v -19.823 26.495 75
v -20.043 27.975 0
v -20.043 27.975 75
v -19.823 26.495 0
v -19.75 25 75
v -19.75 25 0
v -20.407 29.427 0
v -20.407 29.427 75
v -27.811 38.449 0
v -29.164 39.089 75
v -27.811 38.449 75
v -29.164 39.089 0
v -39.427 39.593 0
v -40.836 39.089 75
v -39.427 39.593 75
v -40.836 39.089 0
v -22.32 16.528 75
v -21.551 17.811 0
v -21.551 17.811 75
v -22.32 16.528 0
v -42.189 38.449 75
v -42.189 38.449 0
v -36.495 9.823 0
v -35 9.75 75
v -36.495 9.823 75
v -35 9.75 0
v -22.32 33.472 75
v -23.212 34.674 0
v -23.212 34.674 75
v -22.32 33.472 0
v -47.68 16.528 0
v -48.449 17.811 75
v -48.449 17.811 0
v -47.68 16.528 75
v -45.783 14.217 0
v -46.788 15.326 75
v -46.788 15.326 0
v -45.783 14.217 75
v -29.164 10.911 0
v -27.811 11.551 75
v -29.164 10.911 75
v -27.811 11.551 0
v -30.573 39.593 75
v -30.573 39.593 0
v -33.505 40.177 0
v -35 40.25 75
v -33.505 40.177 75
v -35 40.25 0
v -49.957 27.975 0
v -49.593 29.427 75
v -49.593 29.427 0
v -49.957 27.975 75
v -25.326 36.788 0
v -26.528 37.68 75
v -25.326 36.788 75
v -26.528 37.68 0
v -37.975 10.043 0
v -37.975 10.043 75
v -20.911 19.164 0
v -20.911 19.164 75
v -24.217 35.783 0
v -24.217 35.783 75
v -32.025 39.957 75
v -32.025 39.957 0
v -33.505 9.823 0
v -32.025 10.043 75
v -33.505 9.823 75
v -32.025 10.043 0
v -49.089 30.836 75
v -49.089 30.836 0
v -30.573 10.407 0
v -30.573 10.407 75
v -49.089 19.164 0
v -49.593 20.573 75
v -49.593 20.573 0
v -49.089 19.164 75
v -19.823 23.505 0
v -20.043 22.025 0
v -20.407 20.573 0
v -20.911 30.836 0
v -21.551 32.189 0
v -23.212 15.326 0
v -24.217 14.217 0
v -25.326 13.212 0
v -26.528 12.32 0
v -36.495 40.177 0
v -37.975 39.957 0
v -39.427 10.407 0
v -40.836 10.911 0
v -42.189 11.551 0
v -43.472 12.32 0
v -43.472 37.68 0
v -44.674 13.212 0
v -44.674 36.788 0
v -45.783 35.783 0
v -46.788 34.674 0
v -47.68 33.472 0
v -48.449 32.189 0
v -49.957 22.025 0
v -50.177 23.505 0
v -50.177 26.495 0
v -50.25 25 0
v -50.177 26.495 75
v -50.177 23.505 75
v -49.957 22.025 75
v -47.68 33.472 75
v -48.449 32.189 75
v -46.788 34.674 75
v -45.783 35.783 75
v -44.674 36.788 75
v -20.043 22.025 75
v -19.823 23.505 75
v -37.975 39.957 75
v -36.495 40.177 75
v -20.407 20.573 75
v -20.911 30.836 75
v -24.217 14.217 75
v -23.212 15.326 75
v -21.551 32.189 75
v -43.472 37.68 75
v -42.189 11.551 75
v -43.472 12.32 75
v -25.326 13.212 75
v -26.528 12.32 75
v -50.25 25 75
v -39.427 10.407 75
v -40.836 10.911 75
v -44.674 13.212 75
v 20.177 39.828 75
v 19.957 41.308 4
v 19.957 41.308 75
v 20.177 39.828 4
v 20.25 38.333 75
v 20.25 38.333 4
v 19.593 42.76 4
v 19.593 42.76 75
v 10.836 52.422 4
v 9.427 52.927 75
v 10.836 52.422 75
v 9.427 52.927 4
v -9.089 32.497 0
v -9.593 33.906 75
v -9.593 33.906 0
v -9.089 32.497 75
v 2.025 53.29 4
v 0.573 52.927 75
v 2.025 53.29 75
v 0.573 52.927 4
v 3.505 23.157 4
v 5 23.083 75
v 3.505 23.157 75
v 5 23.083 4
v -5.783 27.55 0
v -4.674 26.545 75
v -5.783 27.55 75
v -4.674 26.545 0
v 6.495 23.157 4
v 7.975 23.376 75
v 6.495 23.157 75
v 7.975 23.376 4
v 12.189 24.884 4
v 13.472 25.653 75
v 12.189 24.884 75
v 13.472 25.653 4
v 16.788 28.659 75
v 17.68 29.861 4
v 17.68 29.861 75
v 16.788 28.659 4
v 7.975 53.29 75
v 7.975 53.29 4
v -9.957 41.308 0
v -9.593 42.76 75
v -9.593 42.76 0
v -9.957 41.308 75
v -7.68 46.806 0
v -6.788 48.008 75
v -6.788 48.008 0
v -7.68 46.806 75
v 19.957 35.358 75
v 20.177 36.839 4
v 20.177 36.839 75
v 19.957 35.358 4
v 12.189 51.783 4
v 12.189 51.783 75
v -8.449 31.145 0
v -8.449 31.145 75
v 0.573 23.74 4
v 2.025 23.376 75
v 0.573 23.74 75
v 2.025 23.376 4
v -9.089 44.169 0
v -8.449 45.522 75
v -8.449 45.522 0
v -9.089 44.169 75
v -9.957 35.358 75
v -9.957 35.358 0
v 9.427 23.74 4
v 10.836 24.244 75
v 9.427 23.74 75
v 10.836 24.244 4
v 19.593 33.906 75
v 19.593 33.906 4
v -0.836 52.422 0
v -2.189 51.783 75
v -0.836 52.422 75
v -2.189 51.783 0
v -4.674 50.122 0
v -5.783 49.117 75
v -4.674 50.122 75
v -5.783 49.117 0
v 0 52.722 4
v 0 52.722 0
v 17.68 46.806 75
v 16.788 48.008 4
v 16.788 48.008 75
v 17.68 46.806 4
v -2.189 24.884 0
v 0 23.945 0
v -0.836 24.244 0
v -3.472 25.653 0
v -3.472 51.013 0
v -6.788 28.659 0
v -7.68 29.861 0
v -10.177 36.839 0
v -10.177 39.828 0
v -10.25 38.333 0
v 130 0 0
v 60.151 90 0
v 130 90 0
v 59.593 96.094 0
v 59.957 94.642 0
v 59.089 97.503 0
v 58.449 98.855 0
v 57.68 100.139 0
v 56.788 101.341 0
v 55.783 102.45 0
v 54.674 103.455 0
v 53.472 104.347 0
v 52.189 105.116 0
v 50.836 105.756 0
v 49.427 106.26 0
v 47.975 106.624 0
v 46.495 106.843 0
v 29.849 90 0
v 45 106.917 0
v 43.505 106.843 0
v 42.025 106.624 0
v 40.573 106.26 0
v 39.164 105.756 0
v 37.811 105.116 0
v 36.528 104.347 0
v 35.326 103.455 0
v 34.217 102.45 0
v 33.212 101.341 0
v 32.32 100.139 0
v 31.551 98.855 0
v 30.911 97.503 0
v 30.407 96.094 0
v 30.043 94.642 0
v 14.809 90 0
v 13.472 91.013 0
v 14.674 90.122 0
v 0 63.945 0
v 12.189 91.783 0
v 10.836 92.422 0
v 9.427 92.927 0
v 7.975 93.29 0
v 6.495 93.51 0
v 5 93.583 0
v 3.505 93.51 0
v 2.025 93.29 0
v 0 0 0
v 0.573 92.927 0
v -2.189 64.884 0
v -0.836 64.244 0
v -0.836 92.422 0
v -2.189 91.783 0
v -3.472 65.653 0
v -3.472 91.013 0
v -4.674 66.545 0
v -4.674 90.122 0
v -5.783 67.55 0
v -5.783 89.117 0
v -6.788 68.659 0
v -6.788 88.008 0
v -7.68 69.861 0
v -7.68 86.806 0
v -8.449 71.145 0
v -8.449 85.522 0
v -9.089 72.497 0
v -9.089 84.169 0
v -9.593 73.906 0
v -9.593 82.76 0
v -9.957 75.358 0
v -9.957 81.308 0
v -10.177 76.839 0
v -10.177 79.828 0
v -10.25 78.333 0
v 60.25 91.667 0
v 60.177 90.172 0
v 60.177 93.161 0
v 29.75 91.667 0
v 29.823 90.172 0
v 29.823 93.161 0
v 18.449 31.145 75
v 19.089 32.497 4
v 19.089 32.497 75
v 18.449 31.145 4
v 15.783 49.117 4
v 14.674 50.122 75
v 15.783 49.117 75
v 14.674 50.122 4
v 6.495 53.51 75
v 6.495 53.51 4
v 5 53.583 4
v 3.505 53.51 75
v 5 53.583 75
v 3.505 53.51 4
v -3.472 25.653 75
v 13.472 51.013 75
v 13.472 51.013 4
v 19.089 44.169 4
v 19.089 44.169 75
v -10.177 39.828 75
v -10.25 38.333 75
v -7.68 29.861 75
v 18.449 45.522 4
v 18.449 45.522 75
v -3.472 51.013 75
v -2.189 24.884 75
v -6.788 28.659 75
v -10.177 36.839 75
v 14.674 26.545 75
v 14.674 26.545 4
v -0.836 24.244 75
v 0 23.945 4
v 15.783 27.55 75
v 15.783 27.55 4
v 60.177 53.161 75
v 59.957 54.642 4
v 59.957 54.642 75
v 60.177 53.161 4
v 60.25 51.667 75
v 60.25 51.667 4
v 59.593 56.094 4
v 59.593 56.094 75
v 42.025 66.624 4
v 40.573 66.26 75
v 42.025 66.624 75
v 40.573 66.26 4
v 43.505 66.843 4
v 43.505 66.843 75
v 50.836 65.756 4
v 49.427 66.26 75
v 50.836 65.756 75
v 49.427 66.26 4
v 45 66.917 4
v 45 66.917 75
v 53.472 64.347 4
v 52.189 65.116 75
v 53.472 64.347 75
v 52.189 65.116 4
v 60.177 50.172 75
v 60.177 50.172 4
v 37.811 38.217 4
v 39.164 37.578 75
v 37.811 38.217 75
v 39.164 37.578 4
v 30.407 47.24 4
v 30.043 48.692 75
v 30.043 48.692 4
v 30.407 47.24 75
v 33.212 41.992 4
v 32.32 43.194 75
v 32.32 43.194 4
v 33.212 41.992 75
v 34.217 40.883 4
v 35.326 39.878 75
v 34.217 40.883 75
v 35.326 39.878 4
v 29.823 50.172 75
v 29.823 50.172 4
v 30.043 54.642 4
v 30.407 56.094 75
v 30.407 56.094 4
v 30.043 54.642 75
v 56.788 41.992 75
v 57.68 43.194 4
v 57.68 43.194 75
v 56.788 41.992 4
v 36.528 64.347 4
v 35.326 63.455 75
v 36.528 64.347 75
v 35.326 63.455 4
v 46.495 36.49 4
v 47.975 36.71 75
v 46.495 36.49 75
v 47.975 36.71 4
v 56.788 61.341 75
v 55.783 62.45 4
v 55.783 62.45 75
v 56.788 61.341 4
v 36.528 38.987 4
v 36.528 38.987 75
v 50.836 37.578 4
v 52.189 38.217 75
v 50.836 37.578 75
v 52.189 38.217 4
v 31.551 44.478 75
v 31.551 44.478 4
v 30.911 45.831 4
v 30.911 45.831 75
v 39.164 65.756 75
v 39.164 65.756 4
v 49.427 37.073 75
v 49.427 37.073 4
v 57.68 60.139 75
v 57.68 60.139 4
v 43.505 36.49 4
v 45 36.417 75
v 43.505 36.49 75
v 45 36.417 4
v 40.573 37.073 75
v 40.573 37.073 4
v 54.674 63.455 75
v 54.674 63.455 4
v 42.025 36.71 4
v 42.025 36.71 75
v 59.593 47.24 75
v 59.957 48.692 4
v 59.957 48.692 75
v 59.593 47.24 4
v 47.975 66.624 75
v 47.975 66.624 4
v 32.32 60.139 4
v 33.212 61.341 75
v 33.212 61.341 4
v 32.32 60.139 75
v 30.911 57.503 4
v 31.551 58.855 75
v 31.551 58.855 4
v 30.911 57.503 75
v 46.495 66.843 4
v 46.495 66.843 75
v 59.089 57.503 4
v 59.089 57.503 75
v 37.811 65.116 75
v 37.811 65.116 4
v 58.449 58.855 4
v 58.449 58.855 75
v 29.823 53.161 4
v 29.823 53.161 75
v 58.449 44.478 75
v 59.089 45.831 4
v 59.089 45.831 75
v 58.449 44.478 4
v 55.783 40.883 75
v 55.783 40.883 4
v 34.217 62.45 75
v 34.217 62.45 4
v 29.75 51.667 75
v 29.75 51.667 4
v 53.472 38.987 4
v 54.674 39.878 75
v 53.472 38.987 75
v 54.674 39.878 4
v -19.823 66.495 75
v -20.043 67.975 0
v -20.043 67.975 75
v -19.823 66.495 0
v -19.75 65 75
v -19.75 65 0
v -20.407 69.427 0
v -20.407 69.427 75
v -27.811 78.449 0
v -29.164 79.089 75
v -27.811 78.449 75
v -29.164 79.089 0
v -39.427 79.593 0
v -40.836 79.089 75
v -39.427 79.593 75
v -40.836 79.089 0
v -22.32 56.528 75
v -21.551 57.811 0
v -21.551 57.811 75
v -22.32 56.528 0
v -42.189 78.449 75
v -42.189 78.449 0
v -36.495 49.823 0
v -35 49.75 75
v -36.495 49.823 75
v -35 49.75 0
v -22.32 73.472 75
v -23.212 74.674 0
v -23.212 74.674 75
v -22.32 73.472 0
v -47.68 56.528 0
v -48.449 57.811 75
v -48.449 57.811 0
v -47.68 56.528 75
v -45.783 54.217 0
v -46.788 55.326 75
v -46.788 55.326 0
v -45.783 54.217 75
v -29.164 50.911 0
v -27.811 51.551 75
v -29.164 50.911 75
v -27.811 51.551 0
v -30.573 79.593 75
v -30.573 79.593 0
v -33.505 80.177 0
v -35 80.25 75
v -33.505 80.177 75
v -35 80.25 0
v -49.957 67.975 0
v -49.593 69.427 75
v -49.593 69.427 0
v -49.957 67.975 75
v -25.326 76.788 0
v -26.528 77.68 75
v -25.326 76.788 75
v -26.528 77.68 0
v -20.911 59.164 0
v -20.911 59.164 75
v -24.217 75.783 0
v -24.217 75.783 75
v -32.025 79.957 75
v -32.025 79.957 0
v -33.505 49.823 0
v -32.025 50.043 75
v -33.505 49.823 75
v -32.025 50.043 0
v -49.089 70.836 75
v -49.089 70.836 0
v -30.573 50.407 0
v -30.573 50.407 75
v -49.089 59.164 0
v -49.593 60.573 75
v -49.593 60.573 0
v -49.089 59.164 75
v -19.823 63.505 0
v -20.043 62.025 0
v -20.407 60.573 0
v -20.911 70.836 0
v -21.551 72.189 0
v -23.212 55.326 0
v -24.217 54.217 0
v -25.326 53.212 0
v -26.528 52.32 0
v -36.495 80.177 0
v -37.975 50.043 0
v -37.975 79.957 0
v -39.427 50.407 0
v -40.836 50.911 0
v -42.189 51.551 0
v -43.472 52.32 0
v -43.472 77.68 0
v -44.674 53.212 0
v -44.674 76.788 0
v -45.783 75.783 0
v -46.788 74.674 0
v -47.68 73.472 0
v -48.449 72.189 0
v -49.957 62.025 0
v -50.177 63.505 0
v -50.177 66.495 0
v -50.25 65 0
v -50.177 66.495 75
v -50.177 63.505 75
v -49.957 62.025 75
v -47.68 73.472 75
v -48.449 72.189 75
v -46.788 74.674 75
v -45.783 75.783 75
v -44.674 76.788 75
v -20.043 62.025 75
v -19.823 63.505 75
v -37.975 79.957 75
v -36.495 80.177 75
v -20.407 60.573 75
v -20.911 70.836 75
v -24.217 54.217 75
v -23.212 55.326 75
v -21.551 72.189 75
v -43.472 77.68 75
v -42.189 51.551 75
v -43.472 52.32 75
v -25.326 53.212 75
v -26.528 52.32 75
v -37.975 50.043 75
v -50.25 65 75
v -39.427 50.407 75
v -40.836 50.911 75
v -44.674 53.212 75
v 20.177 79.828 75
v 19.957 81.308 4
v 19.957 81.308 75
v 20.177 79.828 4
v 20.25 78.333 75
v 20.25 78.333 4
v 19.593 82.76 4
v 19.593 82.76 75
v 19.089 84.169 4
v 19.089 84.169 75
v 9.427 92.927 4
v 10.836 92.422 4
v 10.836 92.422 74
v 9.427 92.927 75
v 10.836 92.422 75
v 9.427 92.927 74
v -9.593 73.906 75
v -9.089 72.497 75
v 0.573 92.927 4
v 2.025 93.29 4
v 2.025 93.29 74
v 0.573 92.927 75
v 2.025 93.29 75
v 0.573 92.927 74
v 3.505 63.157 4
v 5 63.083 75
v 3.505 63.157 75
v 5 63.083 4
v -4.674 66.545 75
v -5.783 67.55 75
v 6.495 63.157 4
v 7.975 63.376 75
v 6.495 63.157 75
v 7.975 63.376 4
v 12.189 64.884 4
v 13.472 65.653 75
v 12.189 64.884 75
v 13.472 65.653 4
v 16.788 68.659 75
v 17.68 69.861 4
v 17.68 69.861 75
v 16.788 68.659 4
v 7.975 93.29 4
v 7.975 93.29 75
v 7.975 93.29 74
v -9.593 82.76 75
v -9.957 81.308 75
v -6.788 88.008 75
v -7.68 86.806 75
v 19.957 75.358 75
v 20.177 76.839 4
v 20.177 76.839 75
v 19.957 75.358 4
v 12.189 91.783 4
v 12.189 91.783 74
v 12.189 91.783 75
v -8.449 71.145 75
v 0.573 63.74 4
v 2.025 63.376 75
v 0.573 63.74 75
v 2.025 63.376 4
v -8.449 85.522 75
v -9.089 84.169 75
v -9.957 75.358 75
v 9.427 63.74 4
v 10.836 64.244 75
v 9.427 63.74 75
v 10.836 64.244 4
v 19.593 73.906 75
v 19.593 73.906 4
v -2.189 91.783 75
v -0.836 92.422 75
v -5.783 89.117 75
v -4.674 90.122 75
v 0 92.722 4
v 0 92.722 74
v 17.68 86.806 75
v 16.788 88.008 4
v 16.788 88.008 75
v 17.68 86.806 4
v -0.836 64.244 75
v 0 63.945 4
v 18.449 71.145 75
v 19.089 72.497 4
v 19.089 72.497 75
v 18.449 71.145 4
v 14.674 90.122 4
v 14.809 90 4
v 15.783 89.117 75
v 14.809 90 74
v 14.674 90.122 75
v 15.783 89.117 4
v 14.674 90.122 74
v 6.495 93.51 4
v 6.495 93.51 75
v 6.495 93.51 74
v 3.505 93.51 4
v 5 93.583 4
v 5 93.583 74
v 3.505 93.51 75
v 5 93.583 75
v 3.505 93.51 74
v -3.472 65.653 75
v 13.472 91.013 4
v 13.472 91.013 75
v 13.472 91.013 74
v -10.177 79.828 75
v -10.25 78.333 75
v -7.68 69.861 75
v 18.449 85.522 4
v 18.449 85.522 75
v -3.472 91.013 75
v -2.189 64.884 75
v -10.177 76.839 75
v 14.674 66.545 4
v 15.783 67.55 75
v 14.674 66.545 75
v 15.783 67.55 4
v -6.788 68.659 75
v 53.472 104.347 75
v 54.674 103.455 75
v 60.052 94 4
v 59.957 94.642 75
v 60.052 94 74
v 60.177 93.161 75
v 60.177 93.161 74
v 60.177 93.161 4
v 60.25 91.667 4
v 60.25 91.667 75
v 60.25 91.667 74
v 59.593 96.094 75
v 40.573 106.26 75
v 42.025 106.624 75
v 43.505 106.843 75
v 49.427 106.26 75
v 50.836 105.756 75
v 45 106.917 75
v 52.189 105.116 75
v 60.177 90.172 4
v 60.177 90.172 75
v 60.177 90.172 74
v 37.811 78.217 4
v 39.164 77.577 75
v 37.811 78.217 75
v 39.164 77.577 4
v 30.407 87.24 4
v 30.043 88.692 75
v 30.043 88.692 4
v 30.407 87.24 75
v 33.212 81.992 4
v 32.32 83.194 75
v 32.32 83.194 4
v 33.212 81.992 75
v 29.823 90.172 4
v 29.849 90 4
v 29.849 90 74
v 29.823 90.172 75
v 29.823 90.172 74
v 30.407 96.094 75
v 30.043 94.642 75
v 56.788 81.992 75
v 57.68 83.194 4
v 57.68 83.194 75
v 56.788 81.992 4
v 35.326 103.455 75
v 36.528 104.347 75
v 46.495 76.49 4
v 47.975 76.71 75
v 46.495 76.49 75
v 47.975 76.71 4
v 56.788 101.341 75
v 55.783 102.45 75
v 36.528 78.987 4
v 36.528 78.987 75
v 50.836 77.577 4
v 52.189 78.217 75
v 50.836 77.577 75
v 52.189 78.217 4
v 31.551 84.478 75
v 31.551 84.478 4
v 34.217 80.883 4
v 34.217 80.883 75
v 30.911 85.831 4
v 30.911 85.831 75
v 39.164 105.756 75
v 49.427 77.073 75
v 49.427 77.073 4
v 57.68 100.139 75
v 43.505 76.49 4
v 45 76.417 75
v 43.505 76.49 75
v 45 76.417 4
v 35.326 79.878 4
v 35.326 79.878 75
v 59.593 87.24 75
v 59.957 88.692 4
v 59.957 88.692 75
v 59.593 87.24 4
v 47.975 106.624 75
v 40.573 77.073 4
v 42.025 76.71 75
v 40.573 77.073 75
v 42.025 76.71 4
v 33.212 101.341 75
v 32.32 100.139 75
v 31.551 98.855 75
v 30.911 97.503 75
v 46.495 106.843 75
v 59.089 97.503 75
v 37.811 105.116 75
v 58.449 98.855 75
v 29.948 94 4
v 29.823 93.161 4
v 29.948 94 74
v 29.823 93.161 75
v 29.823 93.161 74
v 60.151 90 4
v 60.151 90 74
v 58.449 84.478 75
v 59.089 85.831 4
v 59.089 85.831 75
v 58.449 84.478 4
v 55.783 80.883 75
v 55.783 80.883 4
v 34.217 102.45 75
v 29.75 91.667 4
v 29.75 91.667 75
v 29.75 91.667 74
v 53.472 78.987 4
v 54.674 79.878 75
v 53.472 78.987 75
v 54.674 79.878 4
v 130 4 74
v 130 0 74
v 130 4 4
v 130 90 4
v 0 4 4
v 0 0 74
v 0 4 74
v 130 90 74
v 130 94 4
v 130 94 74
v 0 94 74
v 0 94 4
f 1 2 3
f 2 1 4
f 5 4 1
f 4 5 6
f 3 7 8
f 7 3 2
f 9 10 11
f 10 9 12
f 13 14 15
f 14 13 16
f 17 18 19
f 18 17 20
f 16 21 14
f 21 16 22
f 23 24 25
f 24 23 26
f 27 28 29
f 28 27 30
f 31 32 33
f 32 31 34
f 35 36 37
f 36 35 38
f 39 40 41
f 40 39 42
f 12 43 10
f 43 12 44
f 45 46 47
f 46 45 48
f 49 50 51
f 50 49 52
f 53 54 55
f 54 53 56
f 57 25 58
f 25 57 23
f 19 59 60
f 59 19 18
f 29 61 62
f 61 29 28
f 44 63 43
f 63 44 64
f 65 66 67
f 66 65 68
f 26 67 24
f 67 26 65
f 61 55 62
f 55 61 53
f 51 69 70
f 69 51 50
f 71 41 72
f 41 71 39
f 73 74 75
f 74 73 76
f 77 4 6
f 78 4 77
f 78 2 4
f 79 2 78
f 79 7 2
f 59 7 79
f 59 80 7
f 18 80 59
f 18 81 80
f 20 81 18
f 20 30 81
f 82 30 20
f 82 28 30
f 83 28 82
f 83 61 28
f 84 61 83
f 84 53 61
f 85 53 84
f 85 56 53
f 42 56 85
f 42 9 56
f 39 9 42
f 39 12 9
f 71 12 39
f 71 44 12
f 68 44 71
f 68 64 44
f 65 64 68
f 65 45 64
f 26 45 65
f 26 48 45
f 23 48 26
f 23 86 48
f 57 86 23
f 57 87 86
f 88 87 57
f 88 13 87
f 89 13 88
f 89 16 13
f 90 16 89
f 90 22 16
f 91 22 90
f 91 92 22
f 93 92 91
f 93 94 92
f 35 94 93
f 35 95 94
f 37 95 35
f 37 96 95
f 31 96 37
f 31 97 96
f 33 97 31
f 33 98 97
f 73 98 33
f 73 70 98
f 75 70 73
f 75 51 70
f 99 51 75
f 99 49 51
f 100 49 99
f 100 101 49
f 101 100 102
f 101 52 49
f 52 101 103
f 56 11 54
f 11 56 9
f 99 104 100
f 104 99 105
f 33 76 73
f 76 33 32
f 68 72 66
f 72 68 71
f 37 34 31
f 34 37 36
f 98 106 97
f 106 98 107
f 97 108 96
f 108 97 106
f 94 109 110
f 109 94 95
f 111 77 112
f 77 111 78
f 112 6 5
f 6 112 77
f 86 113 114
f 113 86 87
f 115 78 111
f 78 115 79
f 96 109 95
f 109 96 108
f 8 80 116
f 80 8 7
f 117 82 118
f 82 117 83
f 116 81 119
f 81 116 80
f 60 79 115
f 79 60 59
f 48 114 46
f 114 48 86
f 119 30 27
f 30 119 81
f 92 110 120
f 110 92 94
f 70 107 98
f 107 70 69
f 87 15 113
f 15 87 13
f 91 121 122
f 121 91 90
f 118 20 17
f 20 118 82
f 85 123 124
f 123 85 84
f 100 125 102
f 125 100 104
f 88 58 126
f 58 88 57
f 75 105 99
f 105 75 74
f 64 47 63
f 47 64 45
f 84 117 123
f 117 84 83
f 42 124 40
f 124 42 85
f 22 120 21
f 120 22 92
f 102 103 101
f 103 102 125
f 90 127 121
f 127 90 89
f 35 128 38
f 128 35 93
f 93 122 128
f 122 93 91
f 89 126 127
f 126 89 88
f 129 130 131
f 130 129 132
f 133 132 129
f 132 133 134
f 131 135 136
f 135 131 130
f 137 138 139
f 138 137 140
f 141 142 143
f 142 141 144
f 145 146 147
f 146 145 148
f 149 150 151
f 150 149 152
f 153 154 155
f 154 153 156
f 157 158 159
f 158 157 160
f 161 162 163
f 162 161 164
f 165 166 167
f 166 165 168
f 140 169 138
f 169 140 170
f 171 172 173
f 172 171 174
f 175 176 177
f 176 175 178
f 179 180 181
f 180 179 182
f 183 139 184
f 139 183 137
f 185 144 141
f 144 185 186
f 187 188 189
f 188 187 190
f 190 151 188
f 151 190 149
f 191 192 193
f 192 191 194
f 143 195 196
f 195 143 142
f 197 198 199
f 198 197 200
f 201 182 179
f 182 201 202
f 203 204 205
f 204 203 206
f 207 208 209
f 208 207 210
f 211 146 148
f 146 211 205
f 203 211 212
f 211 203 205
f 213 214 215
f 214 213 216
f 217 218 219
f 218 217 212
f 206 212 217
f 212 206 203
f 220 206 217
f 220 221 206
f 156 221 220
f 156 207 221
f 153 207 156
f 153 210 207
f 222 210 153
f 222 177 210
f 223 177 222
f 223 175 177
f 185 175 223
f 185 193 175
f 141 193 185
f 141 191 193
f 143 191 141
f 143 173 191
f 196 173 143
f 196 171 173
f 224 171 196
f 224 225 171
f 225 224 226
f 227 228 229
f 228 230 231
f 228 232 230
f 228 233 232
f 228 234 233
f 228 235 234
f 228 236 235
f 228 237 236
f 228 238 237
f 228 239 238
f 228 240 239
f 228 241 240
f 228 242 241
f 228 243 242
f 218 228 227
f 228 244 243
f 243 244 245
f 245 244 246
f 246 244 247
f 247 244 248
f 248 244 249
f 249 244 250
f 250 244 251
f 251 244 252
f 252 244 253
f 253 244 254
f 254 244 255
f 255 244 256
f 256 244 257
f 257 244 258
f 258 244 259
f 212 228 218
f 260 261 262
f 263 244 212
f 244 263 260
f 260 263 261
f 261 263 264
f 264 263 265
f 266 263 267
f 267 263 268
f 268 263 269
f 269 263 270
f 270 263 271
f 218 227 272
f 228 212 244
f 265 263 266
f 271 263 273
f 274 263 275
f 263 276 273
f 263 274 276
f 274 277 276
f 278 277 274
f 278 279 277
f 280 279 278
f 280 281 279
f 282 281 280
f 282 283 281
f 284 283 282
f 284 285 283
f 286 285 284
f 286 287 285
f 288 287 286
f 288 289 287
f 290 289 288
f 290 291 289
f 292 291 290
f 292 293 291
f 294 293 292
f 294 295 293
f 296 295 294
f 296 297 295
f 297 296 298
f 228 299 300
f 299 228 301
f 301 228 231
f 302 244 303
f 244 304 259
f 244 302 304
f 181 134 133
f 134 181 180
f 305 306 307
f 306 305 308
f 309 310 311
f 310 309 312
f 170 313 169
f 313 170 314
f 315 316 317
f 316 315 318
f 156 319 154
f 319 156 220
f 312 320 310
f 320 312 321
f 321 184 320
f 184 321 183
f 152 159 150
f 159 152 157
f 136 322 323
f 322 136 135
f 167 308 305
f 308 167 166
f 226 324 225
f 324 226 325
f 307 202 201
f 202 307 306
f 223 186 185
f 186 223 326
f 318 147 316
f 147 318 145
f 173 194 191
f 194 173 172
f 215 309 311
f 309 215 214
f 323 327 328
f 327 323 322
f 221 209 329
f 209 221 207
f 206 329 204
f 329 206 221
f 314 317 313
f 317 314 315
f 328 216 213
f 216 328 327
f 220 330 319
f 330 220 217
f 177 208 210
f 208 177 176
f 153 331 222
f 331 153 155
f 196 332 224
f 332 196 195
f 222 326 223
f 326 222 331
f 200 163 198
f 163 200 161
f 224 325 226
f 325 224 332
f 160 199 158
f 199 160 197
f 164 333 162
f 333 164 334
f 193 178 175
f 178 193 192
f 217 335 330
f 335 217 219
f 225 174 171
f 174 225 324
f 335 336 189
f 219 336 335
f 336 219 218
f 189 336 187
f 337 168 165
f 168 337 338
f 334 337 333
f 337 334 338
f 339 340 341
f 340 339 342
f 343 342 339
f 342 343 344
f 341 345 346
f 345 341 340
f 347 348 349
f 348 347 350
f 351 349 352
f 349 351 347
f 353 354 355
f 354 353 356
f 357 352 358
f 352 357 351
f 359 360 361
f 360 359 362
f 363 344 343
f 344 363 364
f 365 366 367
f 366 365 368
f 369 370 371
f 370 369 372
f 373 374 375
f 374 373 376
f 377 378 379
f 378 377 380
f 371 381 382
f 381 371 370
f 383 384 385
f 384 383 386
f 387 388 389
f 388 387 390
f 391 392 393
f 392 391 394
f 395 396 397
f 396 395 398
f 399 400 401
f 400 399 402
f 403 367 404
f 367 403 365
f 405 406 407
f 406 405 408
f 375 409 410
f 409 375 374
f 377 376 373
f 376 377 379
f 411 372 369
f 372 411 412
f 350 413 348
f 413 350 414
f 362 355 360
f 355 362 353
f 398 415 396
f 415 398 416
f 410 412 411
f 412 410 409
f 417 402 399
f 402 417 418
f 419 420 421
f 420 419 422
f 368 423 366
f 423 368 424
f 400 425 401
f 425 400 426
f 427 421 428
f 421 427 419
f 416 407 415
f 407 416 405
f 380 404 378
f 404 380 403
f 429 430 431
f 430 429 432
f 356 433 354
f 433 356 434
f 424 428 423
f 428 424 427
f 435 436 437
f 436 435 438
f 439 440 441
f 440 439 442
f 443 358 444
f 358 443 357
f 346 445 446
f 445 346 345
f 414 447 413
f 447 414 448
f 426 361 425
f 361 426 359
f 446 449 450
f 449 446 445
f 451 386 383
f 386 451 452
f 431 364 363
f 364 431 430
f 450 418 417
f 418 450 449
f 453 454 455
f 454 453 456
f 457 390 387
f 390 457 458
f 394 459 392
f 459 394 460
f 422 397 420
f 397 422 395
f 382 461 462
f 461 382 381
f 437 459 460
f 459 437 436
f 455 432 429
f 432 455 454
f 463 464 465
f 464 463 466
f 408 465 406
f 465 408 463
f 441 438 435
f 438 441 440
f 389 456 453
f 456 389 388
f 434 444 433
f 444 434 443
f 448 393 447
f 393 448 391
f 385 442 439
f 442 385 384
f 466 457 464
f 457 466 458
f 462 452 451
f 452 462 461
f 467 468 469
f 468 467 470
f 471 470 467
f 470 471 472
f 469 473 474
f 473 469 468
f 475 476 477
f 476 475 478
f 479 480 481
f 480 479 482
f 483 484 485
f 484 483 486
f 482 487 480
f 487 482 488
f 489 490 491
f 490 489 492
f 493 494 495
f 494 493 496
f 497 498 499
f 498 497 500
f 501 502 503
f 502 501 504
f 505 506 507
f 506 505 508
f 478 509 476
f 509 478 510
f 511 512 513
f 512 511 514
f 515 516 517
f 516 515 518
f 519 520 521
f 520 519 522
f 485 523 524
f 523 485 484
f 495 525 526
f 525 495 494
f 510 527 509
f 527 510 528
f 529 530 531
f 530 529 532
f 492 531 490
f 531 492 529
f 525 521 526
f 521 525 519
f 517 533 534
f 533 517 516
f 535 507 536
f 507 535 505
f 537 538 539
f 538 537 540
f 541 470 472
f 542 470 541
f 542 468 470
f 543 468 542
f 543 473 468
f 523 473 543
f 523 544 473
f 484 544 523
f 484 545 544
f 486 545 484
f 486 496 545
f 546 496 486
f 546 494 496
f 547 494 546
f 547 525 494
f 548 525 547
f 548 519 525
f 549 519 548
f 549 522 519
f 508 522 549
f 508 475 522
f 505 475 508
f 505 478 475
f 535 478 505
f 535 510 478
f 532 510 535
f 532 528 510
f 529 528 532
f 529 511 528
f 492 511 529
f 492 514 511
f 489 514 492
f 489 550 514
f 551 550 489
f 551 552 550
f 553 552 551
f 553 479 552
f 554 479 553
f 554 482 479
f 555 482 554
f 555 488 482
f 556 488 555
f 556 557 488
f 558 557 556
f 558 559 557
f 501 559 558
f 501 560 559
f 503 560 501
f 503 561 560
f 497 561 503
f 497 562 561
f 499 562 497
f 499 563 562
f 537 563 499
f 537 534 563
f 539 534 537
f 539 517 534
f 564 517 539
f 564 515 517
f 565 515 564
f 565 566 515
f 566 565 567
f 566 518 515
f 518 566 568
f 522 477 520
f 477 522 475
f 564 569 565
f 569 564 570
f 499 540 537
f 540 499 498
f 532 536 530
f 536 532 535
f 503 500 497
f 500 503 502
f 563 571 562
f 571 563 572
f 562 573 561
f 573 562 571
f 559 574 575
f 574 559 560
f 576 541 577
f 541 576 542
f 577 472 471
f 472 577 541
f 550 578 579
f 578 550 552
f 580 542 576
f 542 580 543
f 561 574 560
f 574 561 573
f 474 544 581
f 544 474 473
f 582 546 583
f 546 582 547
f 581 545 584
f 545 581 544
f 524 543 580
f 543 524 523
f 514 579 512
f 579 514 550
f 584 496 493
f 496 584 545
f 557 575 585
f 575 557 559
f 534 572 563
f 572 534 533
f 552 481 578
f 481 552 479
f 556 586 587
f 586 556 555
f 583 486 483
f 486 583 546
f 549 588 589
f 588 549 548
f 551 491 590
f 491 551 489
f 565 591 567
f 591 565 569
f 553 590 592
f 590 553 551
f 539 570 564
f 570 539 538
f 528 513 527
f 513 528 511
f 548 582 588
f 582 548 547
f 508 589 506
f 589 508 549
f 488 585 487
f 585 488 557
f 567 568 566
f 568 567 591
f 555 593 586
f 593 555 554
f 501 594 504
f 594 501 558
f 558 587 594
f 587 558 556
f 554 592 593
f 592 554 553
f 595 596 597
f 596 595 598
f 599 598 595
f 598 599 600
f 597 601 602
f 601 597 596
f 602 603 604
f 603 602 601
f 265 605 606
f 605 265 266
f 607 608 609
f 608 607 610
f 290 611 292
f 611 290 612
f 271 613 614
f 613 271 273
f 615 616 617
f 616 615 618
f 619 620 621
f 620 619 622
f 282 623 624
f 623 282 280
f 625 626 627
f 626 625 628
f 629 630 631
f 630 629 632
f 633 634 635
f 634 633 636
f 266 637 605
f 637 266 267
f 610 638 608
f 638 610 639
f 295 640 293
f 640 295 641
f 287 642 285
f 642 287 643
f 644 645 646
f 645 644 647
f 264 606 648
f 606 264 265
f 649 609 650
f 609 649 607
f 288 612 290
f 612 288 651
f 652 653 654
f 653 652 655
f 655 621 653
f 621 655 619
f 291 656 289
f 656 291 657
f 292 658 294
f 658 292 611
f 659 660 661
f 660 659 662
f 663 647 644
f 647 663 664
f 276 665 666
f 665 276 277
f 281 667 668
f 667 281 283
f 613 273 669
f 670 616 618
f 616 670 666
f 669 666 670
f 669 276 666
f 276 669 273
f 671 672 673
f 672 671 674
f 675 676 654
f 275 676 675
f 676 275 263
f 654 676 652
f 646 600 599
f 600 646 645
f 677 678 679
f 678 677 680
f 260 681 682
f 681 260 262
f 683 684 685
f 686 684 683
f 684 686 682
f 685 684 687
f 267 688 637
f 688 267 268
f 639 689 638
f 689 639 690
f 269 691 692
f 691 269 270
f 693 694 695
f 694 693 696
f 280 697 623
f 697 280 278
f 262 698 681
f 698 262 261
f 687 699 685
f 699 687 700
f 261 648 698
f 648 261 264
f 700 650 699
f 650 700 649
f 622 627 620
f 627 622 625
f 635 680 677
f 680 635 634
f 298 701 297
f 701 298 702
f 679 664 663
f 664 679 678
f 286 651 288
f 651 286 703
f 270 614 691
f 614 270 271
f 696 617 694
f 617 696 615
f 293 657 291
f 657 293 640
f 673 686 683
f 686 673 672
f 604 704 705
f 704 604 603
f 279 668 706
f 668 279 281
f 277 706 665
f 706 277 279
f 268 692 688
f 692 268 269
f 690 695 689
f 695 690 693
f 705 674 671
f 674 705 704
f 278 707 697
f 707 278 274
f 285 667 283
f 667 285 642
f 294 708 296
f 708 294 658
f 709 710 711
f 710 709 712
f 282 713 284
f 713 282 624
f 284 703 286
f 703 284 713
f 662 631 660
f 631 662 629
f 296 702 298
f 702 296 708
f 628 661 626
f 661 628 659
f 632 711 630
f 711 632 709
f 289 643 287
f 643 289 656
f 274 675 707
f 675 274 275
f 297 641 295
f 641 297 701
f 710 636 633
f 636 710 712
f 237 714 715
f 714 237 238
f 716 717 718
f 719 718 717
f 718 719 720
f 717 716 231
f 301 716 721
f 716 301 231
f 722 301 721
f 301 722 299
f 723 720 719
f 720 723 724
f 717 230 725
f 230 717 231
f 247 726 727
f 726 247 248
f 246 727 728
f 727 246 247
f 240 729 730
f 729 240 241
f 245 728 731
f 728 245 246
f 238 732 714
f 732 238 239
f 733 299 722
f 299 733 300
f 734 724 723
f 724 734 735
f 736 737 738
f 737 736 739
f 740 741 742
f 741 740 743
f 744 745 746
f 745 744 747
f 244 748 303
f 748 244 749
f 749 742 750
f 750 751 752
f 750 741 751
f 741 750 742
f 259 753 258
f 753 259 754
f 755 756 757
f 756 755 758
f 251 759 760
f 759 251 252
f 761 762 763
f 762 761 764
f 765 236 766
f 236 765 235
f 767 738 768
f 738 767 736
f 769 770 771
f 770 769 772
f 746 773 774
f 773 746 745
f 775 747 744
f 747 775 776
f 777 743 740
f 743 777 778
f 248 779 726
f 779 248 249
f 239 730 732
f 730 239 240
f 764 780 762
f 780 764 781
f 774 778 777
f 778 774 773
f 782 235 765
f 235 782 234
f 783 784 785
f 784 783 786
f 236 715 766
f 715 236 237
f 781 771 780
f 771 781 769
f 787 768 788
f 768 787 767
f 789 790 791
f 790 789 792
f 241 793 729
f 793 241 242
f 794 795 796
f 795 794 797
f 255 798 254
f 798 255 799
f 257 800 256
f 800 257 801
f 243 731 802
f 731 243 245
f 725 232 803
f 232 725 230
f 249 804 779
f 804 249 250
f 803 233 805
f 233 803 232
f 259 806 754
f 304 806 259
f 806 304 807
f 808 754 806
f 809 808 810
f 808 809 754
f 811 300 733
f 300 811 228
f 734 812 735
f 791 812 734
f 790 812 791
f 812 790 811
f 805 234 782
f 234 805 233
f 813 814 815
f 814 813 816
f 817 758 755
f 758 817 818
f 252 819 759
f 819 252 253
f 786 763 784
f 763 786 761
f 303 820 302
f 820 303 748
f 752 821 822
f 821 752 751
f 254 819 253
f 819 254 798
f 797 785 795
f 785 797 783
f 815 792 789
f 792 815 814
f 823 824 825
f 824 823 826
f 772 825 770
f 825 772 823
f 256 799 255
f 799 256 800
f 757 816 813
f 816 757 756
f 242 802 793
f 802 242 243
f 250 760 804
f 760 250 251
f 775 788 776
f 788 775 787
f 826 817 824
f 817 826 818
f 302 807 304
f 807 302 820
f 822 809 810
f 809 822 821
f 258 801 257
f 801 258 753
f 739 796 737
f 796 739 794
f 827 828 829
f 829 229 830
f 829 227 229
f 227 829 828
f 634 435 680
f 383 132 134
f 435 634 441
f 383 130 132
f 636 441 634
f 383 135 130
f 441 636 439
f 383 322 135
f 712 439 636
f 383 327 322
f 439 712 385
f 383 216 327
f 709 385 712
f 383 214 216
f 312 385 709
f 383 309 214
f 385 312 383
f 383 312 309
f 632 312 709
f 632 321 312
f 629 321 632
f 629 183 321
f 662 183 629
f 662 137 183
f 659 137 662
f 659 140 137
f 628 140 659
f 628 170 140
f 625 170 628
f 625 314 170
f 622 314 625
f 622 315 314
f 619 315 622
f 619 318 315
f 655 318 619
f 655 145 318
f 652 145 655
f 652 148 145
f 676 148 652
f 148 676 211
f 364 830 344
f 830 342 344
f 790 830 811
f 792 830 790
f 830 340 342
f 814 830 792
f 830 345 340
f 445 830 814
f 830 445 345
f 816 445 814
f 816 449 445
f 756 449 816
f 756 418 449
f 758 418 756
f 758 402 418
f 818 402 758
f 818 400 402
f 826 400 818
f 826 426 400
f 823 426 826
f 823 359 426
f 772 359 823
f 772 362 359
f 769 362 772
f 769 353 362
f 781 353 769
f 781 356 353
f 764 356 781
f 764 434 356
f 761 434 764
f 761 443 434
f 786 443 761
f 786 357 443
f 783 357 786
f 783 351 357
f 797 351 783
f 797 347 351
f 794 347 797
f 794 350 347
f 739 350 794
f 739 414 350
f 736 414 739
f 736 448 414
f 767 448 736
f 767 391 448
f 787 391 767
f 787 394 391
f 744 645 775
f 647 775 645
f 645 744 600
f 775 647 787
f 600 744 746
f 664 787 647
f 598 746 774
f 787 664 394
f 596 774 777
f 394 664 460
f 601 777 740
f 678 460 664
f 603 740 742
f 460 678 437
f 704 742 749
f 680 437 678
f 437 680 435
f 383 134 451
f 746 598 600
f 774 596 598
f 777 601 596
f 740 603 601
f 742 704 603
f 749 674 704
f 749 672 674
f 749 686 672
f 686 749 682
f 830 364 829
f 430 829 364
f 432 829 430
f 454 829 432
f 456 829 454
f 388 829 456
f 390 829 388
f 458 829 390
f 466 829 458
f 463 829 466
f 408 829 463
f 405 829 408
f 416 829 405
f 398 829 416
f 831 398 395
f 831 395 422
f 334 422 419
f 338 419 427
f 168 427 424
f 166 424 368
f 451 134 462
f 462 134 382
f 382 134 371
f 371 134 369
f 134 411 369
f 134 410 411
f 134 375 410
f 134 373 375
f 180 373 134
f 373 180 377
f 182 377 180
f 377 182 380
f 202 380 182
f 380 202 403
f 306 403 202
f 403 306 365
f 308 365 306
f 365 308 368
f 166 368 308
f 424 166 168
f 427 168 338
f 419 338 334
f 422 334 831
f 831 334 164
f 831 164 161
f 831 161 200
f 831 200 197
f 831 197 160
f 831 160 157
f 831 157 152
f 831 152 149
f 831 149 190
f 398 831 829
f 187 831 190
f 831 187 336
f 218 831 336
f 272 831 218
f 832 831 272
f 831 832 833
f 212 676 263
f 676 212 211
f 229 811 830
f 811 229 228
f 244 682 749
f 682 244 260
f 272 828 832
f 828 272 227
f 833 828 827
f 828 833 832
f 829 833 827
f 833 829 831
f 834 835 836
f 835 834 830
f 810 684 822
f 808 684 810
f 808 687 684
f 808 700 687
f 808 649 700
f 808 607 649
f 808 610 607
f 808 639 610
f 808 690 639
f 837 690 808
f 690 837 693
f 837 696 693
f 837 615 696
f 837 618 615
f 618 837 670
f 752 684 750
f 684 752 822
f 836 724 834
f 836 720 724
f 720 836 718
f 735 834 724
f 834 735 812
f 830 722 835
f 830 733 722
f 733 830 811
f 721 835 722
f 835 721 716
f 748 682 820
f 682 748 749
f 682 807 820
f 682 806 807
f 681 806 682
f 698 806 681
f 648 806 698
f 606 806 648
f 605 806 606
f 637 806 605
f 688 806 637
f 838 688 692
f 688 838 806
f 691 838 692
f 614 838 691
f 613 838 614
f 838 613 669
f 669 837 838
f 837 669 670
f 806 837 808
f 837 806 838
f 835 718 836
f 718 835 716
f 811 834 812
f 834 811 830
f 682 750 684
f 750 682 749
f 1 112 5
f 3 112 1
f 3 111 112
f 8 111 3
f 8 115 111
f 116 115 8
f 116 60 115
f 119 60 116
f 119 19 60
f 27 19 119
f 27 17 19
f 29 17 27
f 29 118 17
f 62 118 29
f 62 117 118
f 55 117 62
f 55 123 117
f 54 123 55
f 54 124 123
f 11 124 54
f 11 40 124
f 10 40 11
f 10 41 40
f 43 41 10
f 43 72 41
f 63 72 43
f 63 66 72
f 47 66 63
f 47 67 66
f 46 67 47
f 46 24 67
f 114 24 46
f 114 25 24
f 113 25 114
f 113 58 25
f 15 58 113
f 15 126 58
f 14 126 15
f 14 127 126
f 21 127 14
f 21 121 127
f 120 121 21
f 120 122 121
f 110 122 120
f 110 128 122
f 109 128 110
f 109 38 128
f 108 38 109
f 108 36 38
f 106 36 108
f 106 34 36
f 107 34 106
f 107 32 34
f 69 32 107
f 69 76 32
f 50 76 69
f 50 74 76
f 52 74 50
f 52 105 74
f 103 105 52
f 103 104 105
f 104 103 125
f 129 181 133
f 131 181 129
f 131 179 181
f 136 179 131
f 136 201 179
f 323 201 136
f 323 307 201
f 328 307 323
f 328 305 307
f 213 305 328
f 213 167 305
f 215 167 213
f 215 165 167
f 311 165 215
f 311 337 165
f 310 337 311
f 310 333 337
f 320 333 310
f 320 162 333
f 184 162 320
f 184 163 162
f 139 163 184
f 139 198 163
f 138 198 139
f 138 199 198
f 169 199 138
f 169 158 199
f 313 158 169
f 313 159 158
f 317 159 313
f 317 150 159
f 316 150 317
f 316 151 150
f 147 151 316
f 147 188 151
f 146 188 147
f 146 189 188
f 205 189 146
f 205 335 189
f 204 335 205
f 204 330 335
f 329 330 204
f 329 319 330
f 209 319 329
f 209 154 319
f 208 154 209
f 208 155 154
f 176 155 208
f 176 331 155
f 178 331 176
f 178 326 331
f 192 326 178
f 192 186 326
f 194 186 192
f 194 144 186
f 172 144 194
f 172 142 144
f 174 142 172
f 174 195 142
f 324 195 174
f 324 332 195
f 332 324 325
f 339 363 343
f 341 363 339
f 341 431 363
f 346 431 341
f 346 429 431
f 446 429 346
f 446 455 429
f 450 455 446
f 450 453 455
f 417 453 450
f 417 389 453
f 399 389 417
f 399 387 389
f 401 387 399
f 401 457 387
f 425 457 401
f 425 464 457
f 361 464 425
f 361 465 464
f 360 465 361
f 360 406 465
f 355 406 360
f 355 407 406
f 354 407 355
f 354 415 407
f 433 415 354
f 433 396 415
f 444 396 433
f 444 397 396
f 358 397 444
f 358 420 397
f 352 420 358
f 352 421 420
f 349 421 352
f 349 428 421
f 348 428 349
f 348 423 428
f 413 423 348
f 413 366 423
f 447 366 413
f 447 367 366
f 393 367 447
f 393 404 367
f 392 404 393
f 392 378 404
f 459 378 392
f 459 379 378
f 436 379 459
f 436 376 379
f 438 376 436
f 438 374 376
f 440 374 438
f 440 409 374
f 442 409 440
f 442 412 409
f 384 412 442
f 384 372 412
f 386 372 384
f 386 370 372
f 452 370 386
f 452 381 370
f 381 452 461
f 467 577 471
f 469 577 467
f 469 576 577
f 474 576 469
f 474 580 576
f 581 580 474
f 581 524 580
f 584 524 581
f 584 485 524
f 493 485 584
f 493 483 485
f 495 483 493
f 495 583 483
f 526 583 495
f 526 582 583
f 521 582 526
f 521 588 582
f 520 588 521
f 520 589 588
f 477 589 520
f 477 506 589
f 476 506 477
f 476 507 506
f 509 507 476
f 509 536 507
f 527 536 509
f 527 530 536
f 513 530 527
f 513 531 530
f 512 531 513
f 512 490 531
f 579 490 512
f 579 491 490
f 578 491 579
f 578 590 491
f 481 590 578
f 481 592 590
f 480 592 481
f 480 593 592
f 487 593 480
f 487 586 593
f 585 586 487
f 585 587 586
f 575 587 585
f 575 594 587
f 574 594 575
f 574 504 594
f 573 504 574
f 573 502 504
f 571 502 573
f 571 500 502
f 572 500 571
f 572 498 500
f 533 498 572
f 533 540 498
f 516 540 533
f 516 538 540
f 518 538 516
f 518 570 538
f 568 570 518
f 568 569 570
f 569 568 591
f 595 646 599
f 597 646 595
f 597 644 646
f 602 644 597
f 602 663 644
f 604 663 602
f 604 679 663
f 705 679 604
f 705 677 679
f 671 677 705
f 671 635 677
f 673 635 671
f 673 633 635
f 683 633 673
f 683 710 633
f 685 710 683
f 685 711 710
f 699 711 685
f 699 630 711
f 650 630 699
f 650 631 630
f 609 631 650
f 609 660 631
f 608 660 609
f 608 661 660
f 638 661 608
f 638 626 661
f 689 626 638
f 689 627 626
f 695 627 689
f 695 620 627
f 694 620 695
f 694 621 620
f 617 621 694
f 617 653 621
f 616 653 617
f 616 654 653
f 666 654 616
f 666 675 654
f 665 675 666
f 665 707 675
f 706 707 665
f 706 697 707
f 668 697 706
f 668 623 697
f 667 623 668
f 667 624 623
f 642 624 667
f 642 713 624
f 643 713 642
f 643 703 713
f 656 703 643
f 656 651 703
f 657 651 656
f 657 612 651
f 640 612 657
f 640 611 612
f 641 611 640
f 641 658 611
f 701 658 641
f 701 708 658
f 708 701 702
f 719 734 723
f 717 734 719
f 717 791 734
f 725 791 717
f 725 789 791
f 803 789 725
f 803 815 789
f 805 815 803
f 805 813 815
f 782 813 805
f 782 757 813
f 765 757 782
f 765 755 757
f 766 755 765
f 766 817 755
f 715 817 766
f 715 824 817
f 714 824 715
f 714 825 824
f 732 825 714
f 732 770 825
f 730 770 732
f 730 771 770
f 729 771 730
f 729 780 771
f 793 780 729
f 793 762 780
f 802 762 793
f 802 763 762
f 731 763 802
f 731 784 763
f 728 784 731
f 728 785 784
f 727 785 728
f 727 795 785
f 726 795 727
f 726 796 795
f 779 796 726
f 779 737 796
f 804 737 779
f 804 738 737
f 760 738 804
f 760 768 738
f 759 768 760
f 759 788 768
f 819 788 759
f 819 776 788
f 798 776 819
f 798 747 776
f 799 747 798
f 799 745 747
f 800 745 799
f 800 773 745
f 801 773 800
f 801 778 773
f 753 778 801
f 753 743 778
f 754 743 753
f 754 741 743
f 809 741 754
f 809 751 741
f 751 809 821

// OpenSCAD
// Rack for six 50 mL conical (Falcon-type) tubes.
// Print orientation: Flat plate on bed (z=0), walls rising to z=70.
// After printing, flip over so walls are on the bed and tubes hang down.

// Plate dimensions
L     = 130;   // Length (X)
W     = 90;    // Width (Y)
t     = 4;     // Plate thickness (Z)

// Hole specifications
n_holes = 6;
hole_d  = 30.5;
// Grid layout: 2 rows (Y), 3 columns (X)
// Spacing 40mm centre-to-centre
dx = 40;
dy = 40;

// Wall specifications
wall_h = 70;   // Total height of wall from plate top (z=4)
wall_t = 4;    // Wall thickness (Y)

// Derived positions
// Centring the grid on the plate
x_offset = (L - (n_holes - 1) * dx) / 2;
y_offset = (W - (2 - 1) * dy) / 2;

// Calculate wall positions (flush with long edges, i.e., Y = 0 and Y = W)
// Since the plate is at z=0 to z=4, walls start at z=4.
// We model the whole assembly from z=0.
// Wall 1: at Y = 0, from Z=0 to Z=74 (4mm plate + 70mm wall)
// Wall 2: at Y = W, from Z=0 to Z=74

$fn = 64;

module rack() {
    // 1. The Base Plate
    translate([0, 0, 0])
        cube([L, W, t]);

    // 2. The Through Holes
    // We subtract cylinders. To ensure clean cuts, we extend them slightly past the plate top.
    for (i = [0 : n_holes - 1]) {
        // Determine X and Y position for this hole
        // i goes 0, 1, 2 (columns) and we need to map to rows.
        // Let's iterate rows first, then columns to match the description "2 rows of 3".
        // Actually, the loop above is just one index. Let's use nested loops or a single loop with mapping.
        // Mapping: row = i / 3, col = i % 3.
        row = i / 3;
        col = i % 3;
        
        x_pos = x_offset + col * dx;
        y_pos = y_offset + row * dy;
        
        translate([x_pos, y_pos, 0])
            cylinder(h = t + 1, d = hole_d); // +1mm to clear the top face
    }

    // 3. The Side Walls
    // Wall 1: Left side (Y = 0)
    translate([0, 0, 0])
        cube([L, wall_t, wall_h + t]); // Extends down to z=0 for simplicity in union/difference logic if needed, 
                                       // but here we just add to the plate. 
                                       // Wait, the plate is at z=0..4. Walls rise from z=4 to z=74.
                                       // So total height is 74.
                                       // Let's make them sit on the plate.
    
    // Correct approach: Union the plate and walls, then subtract holes.
    // Re-doing structure for clarity:
    
    union() {
        // Base Plate
        translate([0, 0, 0])
            cube([L, W, t]);
        
        // Left Wall (at Y=0)
        translate([0, 0, t])
            cube([L, wall_t, wall_h]);
            
        // Right Wall (at Y=W)
        translate([0, W, t])
            cube([L, wall_t, wall_h]);
    }
    
    // Subtract Holes (applied to the union above)
    for (i = [0 : n_holes - 1]) {
        row = i / 3;
        col = i % 3;
        
        x_pos = x_offset + col * dx;
        y_pos = y_offset + row * dy;
        
        translate([x_pos, y_pos, 0])
            cylinder(h = t + wall_h + 1, d = hole_d); // Extend past top of walls
    }
}

rack();
